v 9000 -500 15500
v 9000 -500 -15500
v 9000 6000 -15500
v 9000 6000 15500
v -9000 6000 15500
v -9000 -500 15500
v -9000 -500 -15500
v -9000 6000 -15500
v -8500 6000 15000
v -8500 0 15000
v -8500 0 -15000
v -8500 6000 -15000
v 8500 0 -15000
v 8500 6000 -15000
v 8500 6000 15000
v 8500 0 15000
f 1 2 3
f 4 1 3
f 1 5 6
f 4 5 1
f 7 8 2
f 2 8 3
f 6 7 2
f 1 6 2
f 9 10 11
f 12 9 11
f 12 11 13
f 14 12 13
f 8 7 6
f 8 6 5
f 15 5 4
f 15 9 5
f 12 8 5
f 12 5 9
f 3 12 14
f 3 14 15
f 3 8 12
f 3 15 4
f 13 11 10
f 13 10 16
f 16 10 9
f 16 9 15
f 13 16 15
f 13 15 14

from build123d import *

# Parameters (mm, degrees)
SKETCH1_W           = 18000
SKETCH1_H           = 31000
SKETCH1_W_2         = 17000
SKETCH1_H_2         = 30000
BOSS_EXTRUDE2_DEPTH = 6000
SKETCH2_W           = 18000
SKETCH2_H           = 500
BOSS_EXTRUDE3_DEPTH = 31000


with BuildPart() as part:
    # Sketch1 → Boss-Extrude2 (new body)
    with BuildSketch(Plane(origin=(0, 0, 0), x_dir=(1, 0, 0), z_dir=(0, 1, 0))):
        Rectangle(SKETCH1_W, SKETCH1_H)
        Rectangle(SKETCH1_W_2, SKETCH1_H_2, mode=Mode.SUBTRACT)
    extrude(amount=BOSS_EXTRUDE2_DEPTH)

    # Sketch2 → Boss-Extrude3 (add)
    with BuildSketch(Plane.XY.offset(15500)):
        with Locations((0, -250)):
            Rectangle(SKETCH2_W, SKETCH2_H)
    extrude(amount=-BOSS_EXTRUDE3_DEPTH)


solid = part.part
